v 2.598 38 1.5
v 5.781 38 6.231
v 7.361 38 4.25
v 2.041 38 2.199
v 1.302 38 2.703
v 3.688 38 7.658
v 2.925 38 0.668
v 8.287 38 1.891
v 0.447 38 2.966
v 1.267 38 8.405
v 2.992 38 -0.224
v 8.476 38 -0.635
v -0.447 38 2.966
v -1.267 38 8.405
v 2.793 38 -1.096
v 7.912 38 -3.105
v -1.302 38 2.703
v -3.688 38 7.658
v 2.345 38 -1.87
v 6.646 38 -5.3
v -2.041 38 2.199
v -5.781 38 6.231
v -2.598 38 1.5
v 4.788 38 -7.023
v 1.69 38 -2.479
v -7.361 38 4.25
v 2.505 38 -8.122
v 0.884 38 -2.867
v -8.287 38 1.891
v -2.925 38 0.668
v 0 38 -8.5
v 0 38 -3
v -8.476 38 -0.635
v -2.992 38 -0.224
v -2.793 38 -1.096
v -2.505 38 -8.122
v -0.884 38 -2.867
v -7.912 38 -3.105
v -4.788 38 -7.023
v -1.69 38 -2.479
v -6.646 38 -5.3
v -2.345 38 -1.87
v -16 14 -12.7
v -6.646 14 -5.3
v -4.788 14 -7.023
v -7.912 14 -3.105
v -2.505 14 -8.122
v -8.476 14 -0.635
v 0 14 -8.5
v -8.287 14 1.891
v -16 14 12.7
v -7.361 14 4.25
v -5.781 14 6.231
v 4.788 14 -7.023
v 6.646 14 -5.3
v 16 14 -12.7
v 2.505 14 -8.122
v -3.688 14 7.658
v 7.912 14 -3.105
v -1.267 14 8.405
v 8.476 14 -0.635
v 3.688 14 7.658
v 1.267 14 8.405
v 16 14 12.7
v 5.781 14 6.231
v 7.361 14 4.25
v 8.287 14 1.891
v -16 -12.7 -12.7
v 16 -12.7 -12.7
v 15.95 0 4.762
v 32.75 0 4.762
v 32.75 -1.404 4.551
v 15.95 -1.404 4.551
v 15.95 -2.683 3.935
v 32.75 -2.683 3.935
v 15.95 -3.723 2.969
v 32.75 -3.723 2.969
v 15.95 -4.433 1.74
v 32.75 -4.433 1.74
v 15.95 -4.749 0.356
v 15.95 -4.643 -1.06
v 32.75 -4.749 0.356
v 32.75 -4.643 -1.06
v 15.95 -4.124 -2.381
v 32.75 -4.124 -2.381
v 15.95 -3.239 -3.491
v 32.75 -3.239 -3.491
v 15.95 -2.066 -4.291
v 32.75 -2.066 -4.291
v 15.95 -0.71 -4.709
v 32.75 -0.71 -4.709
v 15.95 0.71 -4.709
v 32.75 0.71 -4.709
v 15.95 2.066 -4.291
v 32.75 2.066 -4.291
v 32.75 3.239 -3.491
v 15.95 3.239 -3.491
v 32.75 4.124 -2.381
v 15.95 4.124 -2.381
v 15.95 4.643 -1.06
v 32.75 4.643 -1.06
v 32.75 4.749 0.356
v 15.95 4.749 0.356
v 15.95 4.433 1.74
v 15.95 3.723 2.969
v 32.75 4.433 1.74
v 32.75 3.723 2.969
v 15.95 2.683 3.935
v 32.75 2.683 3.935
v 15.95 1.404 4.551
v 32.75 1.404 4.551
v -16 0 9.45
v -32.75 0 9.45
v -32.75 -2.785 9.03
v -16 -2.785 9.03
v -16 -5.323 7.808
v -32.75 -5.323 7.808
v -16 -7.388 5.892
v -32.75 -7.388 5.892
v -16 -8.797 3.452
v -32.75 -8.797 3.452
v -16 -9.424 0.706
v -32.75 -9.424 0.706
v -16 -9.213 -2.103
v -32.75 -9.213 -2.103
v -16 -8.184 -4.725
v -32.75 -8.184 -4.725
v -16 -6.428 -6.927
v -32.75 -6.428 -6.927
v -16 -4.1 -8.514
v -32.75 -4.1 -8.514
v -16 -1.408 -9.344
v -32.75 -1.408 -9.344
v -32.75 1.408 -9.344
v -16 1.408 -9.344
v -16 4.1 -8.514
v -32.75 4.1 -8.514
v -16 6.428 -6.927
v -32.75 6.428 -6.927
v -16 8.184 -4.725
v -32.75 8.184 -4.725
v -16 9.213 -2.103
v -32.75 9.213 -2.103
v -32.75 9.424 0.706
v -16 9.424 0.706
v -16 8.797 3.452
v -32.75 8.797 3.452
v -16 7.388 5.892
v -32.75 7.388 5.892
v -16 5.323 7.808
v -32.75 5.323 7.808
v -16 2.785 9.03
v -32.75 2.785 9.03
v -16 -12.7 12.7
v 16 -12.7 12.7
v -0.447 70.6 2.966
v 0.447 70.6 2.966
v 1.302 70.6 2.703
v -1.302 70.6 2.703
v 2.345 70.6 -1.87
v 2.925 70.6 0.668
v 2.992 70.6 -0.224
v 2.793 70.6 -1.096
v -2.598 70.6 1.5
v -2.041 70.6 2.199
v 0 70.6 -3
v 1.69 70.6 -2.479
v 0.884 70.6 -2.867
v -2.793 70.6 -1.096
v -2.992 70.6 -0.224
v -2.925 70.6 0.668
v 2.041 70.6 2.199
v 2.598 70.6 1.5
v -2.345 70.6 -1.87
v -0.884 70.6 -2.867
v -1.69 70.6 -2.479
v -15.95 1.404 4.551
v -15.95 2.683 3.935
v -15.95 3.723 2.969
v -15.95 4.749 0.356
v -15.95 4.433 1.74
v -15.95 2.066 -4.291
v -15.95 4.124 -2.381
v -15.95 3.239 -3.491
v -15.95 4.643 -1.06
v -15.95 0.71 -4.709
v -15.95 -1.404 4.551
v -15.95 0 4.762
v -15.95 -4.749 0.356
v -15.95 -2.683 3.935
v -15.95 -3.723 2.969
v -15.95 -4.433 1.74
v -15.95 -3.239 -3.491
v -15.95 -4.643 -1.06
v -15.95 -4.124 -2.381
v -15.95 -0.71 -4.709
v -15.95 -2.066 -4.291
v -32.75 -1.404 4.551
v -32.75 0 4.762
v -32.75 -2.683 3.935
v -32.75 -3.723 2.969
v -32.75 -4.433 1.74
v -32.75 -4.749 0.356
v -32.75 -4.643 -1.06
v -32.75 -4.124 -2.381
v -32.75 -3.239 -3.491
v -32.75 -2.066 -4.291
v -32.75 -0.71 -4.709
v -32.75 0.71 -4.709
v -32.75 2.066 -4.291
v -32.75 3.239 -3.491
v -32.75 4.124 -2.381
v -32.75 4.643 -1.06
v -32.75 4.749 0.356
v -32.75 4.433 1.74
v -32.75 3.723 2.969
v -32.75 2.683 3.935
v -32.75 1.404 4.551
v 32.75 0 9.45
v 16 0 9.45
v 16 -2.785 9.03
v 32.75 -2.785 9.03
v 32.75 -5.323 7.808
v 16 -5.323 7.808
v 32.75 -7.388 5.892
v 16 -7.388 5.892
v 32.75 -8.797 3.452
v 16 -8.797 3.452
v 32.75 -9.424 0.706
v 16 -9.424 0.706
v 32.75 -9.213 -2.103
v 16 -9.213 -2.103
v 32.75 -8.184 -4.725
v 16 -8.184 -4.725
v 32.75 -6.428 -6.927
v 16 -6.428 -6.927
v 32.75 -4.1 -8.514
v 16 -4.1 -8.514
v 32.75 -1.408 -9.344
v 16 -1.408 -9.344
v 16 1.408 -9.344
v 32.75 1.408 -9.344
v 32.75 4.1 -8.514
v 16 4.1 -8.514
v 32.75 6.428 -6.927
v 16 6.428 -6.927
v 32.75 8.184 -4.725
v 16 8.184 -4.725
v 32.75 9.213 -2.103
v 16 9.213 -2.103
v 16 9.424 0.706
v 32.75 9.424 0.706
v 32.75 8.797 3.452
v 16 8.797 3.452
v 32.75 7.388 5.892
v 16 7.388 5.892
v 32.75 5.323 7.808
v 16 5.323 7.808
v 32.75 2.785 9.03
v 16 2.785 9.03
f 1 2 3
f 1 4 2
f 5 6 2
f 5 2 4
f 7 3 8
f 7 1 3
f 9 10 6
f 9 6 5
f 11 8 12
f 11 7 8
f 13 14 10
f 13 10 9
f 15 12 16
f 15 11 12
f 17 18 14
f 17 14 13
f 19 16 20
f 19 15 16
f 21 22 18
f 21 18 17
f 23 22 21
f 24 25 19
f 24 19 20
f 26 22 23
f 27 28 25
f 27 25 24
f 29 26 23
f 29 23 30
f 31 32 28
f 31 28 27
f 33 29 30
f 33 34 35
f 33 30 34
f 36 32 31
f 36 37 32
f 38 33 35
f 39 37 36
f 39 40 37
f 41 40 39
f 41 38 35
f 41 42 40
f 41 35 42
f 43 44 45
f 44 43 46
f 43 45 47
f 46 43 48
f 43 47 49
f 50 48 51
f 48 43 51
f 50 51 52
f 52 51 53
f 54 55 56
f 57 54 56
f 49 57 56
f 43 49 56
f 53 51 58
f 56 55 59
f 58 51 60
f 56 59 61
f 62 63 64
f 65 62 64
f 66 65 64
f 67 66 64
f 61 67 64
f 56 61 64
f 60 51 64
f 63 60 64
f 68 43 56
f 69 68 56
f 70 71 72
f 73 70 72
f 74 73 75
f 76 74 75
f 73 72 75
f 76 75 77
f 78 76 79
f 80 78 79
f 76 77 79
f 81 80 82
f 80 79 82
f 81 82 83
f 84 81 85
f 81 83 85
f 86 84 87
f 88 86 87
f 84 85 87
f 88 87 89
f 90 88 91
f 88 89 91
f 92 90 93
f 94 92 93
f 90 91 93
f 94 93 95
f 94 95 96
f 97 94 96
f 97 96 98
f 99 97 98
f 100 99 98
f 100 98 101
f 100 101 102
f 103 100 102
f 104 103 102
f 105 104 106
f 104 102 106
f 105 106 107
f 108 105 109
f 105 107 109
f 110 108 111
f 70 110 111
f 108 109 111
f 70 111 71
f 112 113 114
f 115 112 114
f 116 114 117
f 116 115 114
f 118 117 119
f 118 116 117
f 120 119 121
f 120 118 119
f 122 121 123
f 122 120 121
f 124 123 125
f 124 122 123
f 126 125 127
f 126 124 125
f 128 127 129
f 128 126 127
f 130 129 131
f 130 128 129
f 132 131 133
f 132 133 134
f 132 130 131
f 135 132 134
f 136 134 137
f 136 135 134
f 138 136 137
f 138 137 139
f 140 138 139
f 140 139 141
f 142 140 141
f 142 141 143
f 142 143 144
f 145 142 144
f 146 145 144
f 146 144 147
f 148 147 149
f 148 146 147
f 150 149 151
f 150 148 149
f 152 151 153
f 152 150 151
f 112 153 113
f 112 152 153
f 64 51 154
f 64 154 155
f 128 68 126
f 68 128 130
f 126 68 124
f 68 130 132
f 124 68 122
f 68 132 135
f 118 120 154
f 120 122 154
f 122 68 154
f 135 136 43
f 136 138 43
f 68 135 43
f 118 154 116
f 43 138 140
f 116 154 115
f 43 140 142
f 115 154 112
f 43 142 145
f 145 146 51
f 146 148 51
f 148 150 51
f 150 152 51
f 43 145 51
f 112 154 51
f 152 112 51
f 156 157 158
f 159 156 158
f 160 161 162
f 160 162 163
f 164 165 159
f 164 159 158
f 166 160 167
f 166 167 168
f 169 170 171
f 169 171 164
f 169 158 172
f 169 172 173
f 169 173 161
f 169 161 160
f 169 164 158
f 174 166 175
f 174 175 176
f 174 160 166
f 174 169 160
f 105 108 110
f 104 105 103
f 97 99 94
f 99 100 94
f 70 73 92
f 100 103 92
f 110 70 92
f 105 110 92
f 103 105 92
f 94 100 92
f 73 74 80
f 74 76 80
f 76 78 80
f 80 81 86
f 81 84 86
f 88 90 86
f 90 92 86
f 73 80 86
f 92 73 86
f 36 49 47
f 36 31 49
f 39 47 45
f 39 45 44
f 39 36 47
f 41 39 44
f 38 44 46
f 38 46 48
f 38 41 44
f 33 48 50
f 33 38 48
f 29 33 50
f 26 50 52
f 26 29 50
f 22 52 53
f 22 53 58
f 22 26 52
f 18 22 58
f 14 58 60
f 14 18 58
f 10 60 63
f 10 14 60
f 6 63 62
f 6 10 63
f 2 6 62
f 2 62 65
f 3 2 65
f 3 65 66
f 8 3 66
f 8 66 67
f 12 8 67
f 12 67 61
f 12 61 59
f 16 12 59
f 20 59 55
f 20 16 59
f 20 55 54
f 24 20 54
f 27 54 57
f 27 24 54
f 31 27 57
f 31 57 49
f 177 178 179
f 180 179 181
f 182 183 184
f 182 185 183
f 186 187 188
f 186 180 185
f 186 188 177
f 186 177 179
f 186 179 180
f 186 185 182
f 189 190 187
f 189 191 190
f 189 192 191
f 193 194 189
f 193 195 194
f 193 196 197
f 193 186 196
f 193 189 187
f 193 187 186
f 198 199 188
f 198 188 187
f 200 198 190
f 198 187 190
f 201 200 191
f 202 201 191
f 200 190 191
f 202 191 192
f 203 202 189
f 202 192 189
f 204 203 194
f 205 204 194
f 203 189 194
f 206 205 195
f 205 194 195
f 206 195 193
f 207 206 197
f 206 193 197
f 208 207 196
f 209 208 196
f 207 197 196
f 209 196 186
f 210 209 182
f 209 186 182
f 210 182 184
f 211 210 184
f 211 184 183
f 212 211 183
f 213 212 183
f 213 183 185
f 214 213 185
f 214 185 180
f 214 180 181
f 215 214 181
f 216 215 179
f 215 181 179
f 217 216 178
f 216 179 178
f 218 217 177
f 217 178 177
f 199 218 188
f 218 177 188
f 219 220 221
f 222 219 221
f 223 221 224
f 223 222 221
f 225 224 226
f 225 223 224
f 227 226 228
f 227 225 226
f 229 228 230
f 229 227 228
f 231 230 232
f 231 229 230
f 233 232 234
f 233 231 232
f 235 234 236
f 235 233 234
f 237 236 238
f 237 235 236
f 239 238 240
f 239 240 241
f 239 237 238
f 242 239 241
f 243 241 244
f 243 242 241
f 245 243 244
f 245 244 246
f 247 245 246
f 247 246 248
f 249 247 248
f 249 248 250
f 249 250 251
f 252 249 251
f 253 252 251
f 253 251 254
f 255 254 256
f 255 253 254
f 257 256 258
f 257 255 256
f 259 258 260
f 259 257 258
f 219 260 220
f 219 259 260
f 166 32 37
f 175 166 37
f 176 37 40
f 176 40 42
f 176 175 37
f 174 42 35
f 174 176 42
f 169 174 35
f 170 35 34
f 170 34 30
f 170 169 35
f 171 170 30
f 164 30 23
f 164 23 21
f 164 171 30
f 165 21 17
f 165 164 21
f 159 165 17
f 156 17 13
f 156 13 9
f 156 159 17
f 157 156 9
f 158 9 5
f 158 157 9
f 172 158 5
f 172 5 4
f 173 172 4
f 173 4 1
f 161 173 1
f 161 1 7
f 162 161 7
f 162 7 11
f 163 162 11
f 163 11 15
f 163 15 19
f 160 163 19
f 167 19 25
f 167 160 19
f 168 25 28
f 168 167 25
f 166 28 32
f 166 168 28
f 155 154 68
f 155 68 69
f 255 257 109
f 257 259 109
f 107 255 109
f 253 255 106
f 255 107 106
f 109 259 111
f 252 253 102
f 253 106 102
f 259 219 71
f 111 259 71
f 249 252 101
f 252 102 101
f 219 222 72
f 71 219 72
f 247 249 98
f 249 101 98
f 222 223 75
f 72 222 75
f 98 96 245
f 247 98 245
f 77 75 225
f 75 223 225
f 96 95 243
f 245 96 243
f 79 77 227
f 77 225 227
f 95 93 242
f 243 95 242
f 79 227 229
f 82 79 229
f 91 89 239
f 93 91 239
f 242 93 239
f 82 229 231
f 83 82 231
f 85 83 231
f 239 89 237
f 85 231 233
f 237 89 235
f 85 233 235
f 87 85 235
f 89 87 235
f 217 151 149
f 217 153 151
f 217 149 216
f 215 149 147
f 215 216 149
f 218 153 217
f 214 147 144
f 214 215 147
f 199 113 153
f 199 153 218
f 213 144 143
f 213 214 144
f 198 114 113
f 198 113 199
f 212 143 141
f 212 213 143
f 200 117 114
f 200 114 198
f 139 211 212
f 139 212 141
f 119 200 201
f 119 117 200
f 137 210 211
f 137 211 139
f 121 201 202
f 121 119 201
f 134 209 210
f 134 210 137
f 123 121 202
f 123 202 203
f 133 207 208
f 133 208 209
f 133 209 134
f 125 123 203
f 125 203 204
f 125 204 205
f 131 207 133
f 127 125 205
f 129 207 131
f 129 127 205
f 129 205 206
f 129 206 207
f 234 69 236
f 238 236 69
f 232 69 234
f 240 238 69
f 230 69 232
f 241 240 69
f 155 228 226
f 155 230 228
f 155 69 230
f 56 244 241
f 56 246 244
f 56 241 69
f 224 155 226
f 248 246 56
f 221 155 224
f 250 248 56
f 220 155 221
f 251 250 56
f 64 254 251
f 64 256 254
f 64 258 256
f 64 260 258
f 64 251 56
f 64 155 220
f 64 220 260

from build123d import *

# Parameters (mm, degrees)
BODY_SKETCH_W       = 32
BODY_SKETCH_H       = 26.7
BODY_DEPTH          = 12.7
NUT_X_SKETCH_W      = 16.75
NUT_X_SKETCH_H      = 9.45
NUT_X_SKETCH_2_W    = 16.75
NUT_X_SKETCH_2_H    = 9.45
SOCKET_X_SKETCH_W   = 17.8
SOCKET_X_SKETCH_H   = 4.7625
SOCKET_X_SKETCH_2_W = 17.8
SOCKET_X_SKETCH_2_H = 4.7625


with BuildPart() as part:
    # Body Sketch → Body (new, symmetric)
    with BuildSketch(Plane.XY):
        with Locations((0, 0.65)):
            Rectangle(BODY_SKETCH_W, BODY_SKETCH_H)
    extrude(amount=BODY_DEPTH, both=True)

    # Nut _X Sketch → Nut _X (revolve)
    with BuildSketch(Plane.XY):
        with Locations((24.375, 4.725)):
            Rectangle(NUT_X_SKETCH_W, NUT_X_SKETCH_H)
    revolve(axis=Axis((-1000, 0, 0), (1, 0, 0)))

    # Nut -X Sketch 2 → Nut -X 2 (revolve)
    with BuildSketch(Plane.XY):
        with Locations((-24.375, 4.725)):
            Rectangle(NUT_X_SKETCH_2_W, NUT_X_SKETCH_2_H)
    revolve(axis=Axis((-1000, 0, 0), (1, 0, 0)))

    # Socket _X Sketch → Socket _X (revolve, cut)
    with BuildSketch(Plane.XY):
        with Locations((24.85, 2.38125)):
            Rectangle(SOCKET_X_SKETCH_W, SOCKET_X_SKETCH_H)
    revolve(axis=Axis((-1000, 0, 0), (1, 0, 0)), mode=Mode.SUBTRACT)

    # Socket -X Sketch 2 → Socket -X 2 (revolve, cut)
    with BuildSketch(Plane.XY):
        with Locations((-24.85, 2.38125)):
            Rectangle(SOCKET_X_SKETCH_2_W, SOCKET_X_SKETCH_2_H)
    revolve(axis=Axis((-1000, 0, 0), (1, 0, 0)), mode=Mode.SUBTRACT)

    # Stem Sketch → Stem (revolve)
    with BuildSketch(Plane.XY):
        Polygon((0, 14), (8.5, 14), (8.5, 38), (3, 38), (3, 70.6), (0, 70.6), align=None)
    revolve(axis=Axis((0, -500, 0), (0, 1, 0)))


solid = part.part
